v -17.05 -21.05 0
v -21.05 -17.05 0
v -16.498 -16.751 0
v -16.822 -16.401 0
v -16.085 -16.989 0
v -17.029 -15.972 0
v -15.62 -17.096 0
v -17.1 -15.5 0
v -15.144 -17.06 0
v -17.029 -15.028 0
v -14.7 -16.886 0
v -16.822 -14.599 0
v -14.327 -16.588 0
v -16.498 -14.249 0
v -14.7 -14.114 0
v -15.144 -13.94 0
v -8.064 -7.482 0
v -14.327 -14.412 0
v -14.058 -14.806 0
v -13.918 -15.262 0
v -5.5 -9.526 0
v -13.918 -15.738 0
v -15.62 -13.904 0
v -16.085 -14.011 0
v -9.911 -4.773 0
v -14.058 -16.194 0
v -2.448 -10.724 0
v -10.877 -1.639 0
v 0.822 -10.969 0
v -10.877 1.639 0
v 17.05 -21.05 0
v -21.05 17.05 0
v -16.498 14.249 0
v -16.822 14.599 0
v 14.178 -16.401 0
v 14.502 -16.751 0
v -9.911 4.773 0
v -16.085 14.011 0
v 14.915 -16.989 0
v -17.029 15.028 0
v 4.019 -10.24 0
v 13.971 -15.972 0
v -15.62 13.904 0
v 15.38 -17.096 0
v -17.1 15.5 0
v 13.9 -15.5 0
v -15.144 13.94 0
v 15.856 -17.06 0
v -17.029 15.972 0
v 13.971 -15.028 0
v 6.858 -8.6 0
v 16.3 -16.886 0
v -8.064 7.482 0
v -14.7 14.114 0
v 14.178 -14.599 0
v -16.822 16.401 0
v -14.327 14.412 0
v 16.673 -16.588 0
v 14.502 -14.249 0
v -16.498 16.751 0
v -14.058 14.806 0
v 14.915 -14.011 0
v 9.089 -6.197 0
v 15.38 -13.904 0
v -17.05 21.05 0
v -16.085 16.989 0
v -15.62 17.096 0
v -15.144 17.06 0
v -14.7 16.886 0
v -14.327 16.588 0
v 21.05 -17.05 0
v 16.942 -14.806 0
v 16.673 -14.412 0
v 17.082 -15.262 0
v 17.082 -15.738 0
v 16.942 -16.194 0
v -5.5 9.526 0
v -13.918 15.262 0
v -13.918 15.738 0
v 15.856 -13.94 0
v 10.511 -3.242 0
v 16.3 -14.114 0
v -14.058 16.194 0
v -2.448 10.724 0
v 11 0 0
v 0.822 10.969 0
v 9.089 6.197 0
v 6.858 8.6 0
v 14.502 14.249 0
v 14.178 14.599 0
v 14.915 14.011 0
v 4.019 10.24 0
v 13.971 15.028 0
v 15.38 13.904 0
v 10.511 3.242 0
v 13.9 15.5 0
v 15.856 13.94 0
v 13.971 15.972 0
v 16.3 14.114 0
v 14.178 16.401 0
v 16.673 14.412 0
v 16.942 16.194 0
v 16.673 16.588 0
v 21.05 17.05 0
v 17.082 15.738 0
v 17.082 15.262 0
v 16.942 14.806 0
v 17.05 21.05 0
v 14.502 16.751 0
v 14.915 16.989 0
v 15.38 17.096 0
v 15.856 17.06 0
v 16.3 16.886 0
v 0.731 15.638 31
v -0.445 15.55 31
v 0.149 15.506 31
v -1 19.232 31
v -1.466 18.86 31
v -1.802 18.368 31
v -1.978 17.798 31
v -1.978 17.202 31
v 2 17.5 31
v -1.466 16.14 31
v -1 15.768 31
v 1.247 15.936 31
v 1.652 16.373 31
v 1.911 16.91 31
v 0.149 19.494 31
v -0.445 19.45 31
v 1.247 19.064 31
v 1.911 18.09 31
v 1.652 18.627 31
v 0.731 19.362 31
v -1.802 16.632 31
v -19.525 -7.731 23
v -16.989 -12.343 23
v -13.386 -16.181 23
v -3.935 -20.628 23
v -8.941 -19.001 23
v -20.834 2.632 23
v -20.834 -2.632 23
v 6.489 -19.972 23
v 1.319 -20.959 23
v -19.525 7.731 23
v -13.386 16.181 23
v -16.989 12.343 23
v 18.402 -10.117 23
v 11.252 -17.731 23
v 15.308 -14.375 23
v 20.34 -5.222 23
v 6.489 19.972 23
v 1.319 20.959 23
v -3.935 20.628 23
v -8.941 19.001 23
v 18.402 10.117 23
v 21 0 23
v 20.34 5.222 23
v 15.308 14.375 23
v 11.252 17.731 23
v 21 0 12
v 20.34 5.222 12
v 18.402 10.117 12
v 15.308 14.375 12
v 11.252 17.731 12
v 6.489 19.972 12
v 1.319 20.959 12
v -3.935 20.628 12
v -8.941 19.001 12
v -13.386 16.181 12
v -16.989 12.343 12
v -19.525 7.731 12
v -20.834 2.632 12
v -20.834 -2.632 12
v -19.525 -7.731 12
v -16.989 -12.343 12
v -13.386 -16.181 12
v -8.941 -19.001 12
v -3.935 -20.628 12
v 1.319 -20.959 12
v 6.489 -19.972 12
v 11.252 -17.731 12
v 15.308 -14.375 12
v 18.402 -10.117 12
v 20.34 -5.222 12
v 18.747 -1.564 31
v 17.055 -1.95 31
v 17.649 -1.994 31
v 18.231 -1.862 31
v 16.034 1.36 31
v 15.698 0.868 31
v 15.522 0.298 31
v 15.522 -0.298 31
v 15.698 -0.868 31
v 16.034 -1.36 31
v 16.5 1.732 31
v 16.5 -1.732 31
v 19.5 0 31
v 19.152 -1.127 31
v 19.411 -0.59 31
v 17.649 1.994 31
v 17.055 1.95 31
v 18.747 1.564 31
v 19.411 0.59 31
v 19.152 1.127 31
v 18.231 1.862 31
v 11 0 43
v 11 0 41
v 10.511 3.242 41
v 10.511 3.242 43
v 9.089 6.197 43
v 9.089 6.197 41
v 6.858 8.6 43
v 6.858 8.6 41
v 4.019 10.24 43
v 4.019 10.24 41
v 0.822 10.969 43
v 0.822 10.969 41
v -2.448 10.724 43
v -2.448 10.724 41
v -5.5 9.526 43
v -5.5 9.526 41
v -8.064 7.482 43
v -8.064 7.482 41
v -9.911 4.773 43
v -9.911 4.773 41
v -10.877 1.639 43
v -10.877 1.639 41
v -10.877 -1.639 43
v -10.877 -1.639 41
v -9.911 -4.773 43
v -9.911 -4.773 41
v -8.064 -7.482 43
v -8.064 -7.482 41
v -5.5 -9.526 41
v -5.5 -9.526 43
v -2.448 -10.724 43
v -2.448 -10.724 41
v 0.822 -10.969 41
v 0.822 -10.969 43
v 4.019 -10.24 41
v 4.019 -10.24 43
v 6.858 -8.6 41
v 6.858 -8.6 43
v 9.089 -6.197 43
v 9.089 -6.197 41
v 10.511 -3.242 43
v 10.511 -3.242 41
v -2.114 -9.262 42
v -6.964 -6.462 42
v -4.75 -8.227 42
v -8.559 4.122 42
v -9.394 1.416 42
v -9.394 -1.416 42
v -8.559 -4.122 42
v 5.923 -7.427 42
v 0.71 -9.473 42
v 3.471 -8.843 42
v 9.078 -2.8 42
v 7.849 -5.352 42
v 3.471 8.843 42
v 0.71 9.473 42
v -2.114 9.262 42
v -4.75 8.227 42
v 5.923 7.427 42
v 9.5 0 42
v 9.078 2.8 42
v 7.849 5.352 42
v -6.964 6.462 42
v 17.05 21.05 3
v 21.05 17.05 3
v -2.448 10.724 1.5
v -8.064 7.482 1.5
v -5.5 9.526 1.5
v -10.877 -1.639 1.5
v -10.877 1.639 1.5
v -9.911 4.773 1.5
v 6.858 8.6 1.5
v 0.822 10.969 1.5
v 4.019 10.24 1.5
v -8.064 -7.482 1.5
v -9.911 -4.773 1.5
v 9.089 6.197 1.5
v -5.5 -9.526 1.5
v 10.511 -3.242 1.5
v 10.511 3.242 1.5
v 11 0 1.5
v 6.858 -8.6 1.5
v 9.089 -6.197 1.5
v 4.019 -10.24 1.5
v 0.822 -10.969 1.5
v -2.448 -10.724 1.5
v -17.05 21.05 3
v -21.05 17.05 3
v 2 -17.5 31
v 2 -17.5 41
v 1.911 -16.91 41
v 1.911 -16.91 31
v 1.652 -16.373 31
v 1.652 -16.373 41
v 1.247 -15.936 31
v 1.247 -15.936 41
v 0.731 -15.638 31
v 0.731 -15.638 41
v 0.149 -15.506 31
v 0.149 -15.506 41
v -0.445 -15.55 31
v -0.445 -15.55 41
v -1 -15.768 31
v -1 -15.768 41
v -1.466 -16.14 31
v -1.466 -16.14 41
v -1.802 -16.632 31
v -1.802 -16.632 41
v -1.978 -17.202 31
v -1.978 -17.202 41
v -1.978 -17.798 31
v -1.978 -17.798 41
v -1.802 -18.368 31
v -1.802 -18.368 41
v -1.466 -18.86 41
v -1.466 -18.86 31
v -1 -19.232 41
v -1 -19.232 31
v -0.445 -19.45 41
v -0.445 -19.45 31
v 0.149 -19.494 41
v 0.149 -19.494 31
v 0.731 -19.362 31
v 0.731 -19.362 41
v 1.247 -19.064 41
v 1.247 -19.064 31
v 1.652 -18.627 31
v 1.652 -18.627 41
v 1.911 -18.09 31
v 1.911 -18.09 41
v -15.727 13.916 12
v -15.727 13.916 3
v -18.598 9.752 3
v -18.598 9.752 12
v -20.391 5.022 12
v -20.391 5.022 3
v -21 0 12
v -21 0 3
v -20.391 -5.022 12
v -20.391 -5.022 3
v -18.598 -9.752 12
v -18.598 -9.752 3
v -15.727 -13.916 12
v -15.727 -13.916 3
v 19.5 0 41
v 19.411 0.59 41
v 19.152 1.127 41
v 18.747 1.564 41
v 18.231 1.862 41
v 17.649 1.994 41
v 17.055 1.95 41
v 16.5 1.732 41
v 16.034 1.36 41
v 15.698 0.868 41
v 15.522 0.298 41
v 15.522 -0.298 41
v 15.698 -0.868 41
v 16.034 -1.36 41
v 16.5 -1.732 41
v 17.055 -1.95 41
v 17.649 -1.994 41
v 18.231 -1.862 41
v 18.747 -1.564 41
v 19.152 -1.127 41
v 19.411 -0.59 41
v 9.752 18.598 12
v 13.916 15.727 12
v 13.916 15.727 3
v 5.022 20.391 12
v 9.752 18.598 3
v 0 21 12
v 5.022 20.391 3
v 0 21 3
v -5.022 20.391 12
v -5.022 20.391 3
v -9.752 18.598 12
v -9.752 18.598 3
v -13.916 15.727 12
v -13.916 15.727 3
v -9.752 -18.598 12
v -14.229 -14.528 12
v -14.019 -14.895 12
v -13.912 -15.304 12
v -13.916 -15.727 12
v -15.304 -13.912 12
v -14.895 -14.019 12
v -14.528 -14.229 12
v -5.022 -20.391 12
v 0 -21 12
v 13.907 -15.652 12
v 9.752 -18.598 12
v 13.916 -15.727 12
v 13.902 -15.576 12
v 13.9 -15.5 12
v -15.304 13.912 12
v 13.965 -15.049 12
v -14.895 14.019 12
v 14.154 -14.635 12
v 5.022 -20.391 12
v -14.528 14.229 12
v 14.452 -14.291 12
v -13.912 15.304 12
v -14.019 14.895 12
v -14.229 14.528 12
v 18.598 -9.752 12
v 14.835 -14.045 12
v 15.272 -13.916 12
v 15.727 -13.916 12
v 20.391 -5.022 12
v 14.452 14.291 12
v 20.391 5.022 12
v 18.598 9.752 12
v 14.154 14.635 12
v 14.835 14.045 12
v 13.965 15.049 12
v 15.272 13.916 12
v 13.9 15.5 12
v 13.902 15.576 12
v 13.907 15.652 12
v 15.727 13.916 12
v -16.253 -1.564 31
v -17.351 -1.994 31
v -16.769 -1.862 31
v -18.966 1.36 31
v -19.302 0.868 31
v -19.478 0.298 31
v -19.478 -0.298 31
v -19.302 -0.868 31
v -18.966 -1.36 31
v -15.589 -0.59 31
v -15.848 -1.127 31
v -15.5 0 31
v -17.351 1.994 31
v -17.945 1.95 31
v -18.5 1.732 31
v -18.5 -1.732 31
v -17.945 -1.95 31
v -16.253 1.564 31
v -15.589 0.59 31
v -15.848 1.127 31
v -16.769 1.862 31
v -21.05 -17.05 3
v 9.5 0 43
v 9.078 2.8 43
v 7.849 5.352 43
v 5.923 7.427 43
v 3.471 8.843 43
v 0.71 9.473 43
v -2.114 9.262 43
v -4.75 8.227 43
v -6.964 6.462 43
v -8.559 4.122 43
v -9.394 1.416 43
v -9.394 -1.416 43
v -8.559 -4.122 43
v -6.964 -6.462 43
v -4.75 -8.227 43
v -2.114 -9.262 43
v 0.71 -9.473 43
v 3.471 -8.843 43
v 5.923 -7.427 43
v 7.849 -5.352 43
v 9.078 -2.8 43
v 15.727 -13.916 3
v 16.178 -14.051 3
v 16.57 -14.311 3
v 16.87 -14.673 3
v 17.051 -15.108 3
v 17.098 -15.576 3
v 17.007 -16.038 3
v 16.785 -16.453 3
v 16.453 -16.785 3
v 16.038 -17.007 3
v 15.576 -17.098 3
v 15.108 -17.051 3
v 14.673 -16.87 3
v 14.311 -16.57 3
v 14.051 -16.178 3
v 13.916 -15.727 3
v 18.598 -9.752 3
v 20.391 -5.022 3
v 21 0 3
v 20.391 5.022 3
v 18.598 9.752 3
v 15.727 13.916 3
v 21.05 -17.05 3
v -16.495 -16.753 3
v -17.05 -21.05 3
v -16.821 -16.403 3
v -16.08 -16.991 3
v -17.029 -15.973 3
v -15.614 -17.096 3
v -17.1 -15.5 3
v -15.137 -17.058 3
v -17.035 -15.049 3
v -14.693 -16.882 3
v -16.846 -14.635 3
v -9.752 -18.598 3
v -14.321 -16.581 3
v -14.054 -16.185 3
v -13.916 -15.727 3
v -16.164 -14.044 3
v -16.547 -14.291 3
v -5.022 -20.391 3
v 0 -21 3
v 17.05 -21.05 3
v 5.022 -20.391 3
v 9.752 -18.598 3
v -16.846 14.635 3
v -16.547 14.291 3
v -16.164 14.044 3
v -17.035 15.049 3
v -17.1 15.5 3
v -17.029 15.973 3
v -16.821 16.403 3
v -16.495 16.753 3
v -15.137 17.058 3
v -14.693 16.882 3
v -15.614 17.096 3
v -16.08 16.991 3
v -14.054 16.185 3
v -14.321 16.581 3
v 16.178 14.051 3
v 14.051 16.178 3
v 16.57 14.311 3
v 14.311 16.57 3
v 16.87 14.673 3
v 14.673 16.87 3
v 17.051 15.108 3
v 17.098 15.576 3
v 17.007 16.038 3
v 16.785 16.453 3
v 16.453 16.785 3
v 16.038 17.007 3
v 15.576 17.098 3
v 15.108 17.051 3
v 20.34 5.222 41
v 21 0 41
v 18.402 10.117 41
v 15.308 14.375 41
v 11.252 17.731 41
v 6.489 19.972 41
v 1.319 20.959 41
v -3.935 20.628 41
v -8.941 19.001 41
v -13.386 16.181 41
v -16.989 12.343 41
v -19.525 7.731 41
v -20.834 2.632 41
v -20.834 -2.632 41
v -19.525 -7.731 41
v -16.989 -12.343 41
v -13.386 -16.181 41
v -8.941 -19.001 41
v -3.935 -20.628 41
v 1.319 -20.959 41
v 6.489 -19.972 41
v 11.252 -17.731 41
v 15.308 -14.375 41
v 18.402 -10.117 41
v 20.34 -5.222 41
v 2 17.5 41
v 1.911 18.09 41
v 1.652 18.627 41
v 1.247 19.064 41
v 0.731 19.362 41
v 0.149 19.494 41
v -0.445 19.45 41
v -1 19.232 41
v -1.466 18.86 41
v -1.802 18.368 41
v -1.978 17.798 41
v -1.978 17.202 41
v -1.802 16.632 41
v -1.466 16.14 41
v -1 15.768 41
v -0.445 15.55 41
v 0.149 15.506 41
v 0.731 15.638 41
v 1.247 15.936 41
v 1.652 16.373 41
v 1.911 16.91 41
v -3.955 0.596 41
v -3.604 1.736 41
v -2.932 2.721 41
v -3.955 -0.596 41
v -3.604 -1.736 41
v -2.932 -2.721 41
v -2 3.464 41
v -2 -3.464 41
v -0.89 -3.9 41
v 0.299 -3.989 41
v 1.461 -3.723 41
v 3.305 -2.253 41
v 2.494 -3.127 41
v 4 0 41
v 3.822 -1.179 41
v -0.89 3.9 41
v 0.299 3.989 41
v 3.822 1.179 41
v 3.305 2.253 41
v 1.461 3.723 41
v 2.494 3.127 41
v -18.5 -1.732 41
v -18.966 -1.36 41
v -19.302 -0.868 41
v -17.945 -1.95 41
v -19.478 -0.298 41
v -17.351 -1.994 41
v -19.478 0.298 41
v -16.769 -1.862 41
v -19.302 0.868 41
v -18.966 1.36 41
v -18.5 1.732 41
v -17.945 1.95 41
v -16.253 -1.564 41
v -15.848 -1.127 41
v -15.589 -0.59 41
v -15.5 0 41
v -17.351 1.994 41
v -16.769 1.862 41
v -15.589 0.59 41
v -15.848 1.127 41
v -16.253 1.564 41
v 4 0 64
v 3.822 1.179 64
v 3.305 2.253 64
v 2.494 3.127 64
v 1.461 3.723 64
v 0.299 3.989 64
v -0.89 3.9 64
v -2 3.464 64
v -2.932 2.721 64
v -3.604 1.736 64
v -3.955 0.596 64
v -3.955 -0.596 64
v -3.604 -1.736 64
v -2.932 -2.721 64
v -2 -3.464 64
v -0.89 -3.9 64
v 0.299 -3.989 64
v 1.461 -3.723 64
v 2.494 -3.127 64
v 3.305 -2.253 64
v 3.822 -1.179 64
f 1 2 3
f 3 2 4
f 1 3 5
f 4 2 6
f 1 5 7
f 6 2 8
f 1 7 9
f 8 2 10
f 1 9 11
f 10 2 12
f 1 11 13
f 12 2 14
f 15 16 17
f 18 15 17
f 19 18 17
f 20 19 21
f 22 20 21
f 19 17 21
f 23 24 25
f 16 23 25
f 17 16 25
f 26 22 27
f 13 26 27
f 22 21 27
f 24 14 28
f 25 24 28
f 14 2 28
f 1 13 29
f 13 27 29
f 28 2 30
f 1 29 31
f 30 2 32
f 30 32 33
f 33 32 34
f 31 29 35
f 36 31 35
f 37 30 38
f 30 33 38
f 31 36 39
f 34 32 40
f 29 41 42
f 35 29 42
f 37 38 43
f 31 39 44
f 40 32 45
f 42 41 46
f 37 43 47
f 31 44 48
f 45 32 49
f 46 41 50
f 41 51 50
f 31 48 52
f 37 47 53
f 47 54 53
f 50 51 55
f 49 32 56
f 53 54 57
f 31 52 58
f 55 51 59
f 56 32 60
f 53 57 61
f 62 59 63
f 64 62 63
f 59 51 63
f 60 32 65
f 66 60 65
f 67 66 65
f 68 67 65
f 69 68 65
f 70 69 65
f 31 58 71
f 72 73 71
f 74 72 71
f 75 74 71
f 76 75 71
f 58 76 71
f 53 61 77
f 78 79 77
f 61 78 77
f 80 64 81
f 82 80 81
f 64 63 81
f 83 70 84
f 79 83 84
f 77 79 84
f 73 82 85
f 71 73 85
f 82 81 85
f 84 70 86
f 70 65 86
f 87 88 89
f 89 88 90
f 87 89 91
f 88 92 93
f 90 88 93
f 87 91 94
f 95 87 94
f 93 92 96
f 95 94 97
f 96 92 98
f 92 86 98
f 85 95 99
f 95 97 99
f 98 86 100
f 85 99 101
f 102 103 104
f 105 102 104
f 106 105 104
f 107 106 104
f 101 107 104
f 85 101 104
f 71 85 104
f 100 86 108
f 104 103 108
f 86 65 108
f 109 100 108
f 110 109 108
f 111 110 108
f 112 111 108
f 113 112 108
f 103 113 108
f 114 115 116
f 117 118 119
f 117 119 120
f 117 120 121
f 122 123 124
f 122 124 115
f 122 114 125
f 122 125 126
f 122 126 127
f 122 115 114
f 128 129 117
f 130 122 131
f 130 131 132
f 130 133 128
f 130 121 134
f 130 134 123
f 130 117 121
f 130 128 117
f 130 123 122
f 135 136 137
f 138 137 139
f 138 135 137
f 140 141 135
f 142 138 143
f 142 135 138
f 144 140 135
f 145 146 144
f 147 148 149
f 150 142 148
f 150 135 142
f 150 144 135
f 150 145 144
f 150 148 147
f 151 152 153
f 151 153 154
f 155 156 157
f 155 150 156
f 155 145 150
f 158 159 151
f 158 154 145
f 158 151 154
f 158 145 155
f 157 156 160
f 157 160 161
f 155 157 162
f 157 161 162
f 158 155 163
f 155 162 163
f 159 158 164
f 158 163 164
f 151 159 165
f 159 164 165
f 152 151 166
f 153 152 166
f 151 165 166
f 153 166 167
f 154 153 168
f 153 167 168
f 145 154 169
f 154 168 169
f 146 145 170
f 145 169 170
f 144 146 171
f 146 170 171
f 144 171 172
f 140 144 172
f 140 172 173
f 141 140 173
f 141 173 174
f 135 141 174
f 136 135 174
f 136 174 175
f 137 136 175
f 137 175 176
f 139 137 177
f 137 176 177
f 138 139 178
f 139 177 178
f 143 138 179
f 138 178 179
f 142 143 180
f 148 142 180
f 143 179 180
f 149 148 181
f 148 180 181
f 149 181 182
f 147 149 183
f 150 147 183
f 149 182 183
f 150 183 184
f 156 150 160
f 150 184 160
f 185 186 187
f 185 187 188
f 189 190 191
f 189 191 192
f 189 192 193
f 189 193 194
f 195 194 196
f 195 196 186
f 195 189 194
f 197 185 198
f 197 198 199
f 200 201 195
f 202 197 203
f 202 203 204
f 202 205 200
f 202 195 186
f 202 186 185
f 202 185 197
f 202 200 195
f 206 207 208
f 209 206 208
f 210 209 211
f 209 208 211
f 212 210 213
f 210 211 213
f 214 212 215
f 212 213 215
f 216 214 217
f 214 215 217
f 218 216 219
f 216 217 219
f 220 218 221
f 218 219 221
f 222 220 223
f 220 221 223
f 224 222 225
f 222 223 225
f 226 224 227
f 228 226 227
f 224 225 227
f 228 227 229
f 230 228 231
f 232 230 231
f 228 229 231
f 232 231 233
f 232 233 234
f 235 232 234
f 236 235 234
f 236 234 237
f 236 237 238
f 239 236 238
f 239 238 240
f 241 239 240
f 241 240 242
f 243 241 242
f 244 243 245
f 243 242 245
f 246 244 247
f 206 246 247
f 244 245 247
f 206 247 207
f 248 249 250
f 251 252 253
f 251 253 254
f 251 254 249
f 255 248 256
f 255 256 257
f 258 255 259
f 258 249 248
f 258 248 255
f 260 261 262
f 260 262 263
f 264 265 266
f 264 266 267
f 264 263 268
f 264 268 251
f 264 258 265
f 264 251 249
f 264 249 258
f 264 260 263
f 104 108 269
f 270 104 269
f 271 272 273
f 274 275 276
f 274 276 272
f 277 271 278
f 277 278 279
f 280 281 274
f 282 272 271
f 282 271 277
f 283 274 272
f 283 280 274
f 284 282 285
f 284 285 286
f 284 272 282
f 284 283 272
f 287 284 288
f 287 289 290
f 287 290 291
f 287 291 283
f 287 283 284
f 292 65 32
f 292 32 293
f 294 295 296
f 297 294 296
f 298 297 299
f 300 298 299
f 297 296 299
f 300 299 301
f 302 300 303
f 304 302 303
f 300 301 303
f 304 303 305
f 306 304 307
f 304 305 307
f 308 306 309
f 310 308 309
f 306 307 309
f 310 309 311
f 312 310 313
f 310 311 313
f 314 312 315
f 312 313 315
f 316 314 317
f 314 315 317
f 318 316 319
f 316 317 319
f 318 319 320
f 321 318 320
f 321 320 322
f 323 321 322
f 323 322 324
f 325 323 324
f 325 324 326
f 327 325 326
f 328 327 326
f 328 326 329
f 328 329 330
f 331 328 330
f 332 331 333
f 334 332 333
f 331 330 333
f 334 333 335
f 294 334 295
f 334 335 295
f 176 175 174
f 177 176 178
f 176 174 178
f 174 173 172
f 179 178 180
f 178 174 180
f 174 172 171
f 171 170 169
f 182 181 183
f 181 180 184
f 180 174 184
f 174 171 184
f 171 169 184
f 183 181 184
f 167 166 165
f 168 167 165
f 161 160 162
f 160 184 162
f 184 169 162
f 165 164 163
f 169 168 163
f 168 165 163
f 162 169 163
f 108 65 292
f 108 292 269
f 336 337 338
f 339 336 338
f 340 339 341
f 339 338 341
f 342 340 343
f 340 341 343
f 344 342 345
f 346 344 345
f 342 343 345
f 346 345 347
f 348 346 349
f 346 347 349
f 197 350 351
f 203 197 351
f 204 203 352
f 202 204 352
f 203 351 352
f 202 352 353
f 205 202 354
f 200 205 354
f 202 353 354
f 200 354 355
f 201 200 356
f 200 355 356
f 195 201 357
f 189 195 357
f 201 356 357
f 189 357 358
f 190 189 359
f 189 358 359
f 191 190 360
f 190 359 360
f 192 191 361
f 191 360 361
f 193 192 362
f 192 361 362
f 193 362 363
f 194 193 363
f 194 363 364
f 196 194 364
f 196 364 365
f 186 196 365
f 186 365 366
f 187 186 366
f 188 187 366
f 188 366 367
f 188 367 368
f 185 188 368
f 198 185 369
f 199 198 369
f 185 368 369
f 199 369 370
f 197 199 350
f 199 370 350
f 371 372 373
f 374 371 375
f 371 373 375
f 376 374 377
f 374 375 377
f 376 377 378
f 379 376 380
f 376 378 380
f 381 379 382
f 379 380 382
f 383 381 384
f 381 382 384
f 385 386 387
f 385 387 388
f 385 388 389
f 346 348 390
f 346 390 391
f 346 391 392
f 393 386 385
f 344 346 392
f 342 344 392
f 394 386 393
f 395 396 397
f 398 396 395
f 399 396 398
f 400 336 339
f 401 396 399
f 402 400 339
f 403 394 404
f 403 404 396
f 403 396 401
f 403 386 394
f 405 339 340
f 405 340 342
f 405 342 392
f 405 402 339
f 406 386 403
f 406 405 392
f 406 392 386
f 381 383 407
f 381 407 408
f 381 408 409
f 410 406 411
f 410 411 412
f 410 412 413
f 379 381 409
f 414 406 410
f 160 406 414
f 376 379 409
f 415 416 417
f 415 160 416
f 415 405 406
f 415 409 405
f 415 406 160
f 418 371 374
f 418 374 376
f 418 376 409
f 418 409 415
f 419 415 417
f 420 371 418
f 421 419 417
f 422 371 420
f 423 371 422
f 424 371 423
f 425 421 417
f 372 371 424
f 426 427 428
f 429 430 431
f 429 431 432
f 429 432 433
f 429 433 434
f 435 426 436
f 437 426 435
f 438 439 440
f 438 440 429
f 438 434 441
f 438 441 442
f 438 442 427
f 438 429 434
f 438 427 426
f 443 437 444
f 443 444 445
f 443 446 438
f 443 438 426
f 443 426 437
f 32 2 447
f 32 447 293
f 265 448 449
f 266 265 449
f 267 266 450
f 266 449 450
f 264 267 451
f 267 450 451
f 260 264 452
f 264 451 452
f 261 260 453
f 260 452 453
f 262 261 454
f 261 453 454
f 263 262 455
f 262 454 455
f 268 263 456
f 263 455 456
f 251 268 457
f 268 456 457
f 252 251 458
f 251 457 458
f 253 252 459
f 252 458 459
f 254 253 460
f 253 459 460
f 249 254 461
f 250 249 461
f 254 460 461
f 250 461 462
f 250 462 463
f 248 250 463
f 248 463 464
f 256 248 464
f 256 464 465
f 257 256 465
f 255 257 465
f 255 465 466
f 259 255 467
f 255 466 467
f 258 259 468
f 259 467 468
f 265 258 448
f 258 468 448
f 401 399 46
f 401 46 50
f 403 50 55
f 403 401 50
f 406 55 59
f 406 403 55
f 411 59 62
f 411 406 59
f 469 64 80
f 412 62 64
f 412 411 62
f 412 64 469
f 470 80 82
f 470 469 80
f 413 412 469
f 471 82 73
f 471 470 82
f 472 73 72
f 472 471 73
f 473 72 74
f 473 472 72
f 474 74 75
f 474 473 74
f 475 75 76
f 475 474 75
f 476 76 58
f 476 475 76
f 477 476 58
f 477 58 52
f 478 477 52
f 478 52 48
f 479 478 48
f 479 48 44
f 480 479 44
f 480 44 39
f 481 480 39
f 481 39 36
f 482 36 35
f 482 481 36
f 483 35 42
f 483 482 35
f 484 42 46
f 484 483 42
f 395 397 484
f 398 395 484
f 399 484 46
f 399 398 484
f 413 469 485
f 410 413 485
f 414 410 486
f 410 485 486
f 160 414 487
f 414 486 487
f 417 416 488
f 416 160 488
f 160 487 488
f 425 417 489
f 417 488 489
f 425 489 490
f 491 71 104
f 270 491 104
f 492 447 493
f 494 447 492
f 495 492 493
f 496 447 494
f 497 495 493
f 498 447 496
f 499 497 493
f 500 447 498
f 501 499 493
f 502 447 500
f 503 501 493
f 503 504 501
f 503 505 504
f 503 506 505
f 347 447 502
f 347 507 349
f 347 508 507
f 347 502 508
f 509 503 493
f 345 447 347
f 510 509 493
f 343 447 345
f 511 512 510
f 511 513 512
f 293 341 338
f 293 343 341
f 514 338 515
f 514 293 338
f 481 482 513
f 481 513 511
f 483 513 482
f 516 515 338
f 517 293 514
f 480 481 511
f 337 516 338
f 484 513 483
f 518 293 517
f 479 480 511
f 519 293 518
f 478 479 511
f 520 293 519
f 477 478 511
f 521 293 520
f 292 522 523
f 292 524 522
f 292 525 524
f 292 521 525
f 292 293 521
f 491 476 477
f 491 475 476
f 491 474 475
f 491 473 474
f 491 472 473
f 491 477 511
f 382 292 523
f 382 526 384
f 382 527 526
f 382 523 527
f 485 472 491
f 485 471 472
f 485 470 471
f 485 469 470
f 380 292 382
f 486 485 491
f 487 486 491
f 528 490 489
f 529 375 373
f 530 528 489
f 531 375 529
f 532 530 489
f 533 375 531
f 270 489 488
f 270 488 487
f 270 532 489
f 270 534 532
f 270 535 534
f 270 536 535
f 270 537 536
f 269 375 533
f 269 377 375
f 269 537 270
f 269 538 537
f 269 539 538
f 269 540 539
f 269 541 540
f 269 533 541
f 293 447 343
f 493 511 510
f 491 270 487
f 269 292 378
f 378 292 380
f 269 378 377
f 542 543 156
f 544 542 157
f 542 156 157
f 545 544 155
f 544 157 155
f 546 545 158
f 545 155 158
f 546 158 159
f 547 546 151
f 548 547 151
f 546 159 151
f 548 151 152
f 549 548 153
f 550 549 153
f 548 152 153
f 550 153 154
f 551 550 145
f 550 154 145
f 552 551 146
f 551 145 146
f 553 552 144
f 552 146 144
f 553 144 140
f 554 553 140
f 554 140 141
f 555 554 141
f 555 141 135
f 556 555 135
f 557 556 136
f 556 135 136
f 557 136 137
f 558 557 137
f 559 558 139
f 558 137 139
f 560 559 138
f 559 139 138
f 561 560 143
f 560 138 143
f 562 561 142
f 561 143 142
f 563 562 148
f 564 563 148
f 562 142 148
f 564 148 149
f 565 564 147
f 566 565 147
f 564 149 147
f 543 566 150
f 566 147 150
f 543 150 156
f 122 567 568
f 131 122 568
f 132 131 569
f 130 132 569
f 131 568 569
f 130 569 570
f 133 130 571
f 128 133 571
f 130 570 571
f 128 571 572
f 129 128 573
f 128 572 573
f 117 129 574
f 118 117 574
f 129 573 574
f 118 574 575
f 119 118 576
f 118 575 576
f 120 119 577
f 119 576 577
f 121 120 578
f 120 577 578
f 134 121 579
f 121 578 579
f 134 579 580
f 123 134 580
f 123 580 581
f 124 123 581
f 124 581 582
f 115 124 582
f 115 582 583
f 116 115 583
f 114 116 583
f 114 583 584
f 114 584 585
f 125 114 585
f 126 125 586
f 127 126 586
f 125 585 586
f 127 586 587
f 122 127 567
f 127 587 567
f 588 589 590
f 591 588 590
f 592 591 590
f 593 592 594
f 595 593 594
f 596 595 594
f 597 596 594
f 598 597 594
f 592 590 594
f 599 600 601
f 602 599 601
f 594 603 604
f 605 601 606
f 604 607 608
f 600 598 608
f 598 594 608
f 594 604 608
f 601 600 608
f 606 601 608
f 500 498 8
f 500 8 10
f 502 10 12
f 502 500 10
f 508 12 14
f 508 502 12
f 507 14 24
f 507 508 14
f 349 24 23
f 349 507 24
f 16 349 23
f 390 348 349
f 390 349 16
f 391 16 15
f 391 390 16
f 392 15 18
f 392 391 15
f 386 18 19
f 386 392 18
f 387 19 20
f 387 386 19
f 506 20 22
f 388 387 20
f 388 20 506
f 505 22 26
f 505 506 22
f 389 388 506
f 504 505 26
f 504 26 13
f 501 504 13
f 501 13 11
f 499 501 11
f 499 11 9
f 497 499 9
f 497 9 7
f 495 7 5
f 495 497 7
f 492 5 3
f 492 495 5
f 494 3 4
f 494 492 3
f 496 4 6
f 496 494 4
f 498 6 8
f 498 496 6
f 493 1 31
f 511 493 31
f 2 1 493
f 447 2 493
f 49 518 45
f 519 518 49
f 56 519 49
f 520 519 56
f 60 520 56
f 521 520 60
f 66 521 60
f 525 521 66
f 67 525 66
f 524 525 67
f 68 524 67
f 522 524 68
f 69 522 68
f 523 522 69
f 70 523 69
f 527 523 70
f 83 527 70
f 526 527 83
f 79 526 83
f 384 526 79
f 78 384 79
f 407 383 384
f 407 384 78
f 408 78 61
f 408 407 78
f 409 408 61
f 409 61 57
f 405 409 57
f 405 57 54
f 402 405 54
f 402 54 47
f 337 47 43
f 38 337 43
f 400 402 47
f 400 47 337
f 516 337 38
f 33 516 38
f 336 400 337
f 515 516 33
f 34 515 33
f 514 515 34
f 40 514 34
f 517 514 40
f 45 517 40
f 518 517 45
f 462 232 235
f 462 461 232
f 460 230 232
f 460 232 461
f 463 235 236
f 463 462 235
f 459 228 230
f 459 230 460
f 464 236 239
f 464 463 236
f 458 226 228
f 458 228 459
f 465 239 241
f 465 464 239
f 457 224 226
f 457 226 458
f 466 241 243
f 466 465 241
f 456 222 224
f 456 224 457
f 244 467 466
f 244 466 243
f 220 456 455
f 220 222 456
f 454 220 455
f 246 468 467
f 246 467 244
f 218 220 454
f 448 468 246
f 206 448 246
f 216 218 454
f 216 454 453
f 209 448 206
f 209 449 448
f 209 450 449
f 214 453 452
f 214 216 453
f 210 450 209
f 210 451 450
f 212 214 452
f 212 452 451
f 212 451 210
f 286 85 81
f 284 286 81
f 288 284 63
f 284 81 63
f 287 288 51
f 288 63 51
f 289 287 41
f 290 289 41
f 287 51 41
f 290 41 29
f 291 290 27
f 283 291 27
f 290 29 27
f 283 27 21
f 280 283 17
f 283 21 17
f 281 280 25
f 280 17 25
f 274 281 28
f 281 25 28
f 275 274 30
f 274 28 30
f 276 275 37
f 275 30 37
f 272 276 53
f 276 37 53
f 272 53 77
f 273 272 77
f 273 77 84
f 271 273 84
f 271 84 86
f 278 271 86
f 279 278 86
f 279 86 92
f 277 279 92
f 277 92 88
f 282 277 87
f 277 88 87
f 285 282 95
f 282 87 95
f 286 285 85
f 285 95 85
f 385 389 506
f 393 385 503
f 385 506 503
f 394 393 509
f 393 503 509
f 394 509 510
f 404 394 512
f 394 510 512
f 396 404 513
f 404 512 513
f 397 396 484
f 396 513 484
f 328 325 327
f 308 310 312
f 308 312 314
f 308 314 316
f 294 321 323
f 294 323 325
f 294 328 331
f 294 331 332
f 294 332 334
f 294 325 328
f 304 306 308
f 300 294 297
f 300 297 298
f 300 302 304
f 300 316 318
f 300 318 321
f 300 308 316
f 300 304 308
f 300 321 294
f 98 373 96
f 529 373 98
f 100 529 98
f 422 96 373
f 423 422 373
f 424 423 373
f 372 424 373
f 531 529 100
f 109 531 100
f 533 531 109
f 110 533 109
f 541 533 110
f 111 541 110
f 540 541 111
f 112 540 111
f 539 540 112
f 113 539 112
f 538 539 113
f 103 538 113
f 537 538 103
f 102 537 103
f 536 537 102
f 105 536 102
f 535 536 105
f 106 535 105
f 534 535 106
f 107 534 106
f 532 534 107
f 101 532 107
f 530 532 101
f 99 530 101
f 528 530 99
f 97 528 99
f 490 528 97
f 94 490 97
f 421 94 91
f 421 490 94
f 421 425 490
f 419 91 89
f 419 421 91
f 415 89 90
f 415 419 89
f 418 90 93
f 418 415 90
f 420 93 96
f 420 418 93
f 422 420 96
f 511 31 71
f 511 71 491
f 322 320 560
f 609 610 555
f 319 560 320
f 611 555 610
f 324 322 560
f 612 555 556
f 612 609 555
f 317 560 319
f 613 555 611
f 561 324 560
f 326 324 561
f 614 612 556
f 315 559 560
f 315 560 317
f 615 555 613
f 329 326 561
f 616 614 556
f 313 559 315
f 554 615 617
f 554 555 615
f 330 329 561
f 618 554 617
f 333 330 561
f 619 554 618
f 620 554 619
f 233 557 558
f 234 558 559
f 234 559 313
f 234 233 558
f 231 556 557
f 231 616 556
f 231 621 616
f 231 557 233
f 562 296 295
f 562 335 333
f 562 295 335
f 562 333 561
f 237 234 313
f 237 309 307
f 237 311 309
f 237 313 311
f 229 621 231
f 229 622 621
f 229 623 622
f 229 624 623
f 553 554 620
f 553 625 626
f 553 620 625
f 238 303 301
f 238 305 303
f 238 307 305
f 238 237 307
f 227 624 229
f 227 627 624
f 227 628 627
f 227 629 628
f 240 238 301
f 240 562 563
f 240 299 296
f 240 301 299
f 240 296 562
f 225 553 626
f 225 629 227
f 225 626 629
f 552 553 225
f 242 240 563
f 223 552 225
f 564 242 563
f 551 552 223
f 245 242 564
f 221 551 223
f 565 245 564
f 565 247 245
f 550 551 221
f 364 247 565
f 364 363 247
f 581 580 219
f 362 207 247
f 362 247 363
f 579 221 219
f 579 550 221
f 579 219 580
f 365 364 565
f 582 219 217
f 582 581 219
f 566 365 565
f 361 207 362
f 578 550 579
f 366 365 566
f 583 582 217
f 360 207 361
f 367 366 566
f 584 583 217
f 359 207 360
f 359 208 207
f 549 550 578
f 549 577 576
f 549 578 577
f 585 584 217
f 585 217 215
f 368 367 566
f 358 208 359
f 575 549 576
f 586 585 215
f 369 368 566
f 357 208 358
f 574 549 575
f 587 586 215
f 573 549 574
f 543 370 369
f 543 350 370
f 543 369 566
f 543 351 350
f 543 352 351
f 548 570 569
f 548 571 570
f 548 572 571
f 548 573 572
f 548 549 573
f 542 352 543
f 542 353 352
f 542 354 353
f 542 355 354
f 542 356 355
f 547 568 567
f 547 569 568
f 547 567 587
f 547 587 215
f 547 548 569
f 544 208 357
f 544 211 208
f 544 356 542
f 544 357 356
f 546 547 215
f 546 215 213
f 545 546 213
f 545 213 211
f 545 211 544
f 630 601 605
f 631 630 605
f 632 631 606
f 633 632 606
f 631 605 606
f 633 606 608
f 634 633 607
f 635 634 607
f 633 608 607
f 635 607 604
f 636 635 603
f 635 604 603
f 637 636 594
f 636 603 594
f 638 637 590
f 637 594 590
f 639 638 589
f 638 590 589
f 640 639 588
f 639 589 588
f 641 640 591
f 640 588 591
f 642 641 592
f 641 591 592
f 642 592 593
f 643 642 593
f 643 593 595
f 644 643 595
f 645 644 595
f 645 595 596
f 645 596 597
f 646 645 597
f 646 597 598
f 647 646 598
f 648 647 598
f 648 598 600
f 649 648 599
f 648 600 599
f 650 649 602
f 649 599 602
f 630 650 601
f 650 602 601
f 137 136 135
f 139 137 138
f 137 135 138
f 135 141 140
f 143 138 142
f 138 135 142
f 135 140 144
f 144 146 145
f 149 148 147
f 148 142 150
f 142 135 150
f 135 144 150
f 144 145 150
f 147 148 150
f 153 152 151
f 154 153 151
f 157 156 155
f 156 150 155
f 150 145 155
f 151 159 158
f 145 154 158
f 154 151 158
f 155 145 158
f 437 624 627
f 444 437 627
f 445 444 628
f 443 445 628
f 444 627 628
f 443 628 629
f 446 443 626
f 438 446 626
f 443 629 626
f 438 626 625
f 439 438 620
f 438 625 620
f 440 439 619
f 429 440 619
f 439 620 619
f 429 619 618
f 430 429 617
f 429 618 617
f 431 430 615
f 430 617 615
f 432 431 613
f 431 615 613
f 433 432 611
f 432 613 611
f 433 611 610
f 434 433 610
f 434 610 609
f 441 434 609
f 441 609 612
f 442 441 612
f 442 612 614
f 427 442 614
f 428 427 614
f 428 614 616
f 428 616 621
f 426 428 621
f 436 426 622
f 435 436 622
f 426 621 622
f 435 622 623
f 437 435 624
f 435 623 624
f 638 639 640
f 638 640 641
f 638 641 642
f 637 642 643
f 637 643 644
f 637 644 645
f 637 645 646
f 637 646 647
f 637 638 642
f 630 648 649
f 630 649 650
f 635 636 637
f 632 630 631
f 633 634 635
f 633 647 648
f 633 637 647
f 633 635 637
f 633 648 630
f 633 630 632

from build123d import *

# Parameters (mm, degrees)
SKETCH1_W           = 42.1
SKETCH1_H           = 42.1
BOSS_EXTRUDE2_DEPTH = 3
SKETCH3_R           = 21
BOSS_EXTRUDE3_DEPTH = 9
SKETCH4_R           = 21
BOSS_EXTRUDE4_DEPTH = 11
SKETCH5_R           = 21
BOSS_EXTRUDE5_DEPTH = 18
SKETCH6_R           = 11
BOSS_EXTRUDE6_DEPTH = 2
SKETCH9_R           = 9.5
CUT_EXTRUDE2_DEPTH  = 1
SKETCH7_R           = 4
BOSS_EXTRUDE7_DEPTH = 23
CUT_EXTRUDE3_START  = -12
SKETCH10_R          = 1.6
CUT_EXTRUDE3_DEPTH  = 12
SKETCH12_R          = 2
CUT_EXTRUDE5_DEPTH  = 10
CHAMFER1_SIZE       = 4
SKETCH15_R          = 11
CUT_EXTRUDE8_DEPTH  = 1.5


with BuildPart() as part:
    # Sketch1 → Boss-Extrude2 (new body)
    with BuildSketch(Plane.XY):
        Rectangle(SKETCH1_W, SKETCH1_H)
    extrude(amount=BOSS_EXTRUDE2_DEPTH)

    # Sketch3 → Boss-Extrude3 (add)
    with BuildSketch(Plane.XY.offset(3)):
        Circle(SKETCH3_R)
    extrude(amount=BOSS_EXTRUDE3_DEPTH)

    # Sketch10 → Cut-Extrude3 (cut)
    with BuildSketch(Plane(origin=(0, 0, 0), x_dir=(-1, 0, 0), z_dir=(0, 0, -1)).offset(CUT_EXTRUDE3_START)):
        with Locations((-15.5, 15.5)):
            Circle(SKETCH10_R)
        with Locations((15.5, 15.5)):
            Circle(SKETCH10_R)
        with Locations((15.5, -15.5)):
            Circle(SKETCH10_R)
        with Locations((-15.5, -15.5)):
            Circle(SKETCH10_R)
    extrude(amount=CUT_EXTRUDE3_DEPTH, mode=Mode.SUBTRACT)

    # Chamfer1
    chamfer1_edges = [part.edges().sort_by_distance(p)[0] for p in [
        (-21.05, 21.05, 1.5),
        (21.05, 21.05, 1.5),
        (21.05, -21.05, 1.5),
        (-21.05, -21.05, 1.5),
    ]]
    chamfer(chamfer1_edges, length=CHAMFER1_SIZE)

    # Sketch15 → Cut-Extrude8 (cut)
    with BuildSketch(Plane(origin=(0, 0, 0), x_dir=(-1, 0, 0), z_dir=(0, 0, -1))):
        with Locations(Location((0, 0, 0), (0, 0, 180))):
            Circle(SKETCH15_R)
    extrude(amount=-CUT_EXTRUDE8_DEPTH, mode=Mode.SUBTRACT)


with BuildPart() as body_2:
    # Sketch4 → Boss-Extrude4 (new body)
    with BuildSketch(Plane.XY.offset(12)):
        Circle(SKETCH4_R)
    extrude(amount=BOSS_EXTRUDE4_DEPTH)


with BuildPart() as body_3:
    # Sketch5 → Boss-Extrude5 (new body)
    with BuildSketch(Plane.XY.offset(23)):
        Circle(SKETCH5_R)
    extrude(amount=BOSS_EXTRUDE5_DEPTH)

    # Sketch6 → Boss-Extrude6 (add)
    with BuildSketch(Plane.XY.offset(41)):
        Circle(SKETCH6_R)
    extrude(amount=BOSS_EXTRUDE6_DEPTH)

    # Sketch9 → Cut-Extrude2 (cut)
    with BuildSketch(Plane.XY.offset(43)):
        Circle(SKETCH9_R)
    extrude(amount=-CUT_EXTRUDE2_DEPTH, mode=Mode.SUBTRACT)

    # Sketch12 → Cut-Extrude5 (cut)
    with BuildSketch(Plane.XY.offset(41)):
        with Locations((0, 17.5)):
            Circle(SKETCH12_R)
        with Locations((17.5, 0)):
            Circle(SKETCH12_R)
        with Locations((0, -17.5)):
            Circle(SKETCH12_R)
        with Locations((-17.5, 0)):
            Circle(SKETCH12_R)
    extrude(amount=-CUT_EXTRUDE5_DEPTH, mode=Mode.SUBTRACT)


with BuildPart() as body_4:
    # Sketch7 → Boss-Extrude7 (new body)
    with BuildSketch(Plane.XY.offset(41)):
        Circle(SKETCH7_R)
    extrude(amount=BOSS_EXTRUDE7_DEPTH)


solid = Compound([part.part, body_2.part, body_3.part, body_4.part])
